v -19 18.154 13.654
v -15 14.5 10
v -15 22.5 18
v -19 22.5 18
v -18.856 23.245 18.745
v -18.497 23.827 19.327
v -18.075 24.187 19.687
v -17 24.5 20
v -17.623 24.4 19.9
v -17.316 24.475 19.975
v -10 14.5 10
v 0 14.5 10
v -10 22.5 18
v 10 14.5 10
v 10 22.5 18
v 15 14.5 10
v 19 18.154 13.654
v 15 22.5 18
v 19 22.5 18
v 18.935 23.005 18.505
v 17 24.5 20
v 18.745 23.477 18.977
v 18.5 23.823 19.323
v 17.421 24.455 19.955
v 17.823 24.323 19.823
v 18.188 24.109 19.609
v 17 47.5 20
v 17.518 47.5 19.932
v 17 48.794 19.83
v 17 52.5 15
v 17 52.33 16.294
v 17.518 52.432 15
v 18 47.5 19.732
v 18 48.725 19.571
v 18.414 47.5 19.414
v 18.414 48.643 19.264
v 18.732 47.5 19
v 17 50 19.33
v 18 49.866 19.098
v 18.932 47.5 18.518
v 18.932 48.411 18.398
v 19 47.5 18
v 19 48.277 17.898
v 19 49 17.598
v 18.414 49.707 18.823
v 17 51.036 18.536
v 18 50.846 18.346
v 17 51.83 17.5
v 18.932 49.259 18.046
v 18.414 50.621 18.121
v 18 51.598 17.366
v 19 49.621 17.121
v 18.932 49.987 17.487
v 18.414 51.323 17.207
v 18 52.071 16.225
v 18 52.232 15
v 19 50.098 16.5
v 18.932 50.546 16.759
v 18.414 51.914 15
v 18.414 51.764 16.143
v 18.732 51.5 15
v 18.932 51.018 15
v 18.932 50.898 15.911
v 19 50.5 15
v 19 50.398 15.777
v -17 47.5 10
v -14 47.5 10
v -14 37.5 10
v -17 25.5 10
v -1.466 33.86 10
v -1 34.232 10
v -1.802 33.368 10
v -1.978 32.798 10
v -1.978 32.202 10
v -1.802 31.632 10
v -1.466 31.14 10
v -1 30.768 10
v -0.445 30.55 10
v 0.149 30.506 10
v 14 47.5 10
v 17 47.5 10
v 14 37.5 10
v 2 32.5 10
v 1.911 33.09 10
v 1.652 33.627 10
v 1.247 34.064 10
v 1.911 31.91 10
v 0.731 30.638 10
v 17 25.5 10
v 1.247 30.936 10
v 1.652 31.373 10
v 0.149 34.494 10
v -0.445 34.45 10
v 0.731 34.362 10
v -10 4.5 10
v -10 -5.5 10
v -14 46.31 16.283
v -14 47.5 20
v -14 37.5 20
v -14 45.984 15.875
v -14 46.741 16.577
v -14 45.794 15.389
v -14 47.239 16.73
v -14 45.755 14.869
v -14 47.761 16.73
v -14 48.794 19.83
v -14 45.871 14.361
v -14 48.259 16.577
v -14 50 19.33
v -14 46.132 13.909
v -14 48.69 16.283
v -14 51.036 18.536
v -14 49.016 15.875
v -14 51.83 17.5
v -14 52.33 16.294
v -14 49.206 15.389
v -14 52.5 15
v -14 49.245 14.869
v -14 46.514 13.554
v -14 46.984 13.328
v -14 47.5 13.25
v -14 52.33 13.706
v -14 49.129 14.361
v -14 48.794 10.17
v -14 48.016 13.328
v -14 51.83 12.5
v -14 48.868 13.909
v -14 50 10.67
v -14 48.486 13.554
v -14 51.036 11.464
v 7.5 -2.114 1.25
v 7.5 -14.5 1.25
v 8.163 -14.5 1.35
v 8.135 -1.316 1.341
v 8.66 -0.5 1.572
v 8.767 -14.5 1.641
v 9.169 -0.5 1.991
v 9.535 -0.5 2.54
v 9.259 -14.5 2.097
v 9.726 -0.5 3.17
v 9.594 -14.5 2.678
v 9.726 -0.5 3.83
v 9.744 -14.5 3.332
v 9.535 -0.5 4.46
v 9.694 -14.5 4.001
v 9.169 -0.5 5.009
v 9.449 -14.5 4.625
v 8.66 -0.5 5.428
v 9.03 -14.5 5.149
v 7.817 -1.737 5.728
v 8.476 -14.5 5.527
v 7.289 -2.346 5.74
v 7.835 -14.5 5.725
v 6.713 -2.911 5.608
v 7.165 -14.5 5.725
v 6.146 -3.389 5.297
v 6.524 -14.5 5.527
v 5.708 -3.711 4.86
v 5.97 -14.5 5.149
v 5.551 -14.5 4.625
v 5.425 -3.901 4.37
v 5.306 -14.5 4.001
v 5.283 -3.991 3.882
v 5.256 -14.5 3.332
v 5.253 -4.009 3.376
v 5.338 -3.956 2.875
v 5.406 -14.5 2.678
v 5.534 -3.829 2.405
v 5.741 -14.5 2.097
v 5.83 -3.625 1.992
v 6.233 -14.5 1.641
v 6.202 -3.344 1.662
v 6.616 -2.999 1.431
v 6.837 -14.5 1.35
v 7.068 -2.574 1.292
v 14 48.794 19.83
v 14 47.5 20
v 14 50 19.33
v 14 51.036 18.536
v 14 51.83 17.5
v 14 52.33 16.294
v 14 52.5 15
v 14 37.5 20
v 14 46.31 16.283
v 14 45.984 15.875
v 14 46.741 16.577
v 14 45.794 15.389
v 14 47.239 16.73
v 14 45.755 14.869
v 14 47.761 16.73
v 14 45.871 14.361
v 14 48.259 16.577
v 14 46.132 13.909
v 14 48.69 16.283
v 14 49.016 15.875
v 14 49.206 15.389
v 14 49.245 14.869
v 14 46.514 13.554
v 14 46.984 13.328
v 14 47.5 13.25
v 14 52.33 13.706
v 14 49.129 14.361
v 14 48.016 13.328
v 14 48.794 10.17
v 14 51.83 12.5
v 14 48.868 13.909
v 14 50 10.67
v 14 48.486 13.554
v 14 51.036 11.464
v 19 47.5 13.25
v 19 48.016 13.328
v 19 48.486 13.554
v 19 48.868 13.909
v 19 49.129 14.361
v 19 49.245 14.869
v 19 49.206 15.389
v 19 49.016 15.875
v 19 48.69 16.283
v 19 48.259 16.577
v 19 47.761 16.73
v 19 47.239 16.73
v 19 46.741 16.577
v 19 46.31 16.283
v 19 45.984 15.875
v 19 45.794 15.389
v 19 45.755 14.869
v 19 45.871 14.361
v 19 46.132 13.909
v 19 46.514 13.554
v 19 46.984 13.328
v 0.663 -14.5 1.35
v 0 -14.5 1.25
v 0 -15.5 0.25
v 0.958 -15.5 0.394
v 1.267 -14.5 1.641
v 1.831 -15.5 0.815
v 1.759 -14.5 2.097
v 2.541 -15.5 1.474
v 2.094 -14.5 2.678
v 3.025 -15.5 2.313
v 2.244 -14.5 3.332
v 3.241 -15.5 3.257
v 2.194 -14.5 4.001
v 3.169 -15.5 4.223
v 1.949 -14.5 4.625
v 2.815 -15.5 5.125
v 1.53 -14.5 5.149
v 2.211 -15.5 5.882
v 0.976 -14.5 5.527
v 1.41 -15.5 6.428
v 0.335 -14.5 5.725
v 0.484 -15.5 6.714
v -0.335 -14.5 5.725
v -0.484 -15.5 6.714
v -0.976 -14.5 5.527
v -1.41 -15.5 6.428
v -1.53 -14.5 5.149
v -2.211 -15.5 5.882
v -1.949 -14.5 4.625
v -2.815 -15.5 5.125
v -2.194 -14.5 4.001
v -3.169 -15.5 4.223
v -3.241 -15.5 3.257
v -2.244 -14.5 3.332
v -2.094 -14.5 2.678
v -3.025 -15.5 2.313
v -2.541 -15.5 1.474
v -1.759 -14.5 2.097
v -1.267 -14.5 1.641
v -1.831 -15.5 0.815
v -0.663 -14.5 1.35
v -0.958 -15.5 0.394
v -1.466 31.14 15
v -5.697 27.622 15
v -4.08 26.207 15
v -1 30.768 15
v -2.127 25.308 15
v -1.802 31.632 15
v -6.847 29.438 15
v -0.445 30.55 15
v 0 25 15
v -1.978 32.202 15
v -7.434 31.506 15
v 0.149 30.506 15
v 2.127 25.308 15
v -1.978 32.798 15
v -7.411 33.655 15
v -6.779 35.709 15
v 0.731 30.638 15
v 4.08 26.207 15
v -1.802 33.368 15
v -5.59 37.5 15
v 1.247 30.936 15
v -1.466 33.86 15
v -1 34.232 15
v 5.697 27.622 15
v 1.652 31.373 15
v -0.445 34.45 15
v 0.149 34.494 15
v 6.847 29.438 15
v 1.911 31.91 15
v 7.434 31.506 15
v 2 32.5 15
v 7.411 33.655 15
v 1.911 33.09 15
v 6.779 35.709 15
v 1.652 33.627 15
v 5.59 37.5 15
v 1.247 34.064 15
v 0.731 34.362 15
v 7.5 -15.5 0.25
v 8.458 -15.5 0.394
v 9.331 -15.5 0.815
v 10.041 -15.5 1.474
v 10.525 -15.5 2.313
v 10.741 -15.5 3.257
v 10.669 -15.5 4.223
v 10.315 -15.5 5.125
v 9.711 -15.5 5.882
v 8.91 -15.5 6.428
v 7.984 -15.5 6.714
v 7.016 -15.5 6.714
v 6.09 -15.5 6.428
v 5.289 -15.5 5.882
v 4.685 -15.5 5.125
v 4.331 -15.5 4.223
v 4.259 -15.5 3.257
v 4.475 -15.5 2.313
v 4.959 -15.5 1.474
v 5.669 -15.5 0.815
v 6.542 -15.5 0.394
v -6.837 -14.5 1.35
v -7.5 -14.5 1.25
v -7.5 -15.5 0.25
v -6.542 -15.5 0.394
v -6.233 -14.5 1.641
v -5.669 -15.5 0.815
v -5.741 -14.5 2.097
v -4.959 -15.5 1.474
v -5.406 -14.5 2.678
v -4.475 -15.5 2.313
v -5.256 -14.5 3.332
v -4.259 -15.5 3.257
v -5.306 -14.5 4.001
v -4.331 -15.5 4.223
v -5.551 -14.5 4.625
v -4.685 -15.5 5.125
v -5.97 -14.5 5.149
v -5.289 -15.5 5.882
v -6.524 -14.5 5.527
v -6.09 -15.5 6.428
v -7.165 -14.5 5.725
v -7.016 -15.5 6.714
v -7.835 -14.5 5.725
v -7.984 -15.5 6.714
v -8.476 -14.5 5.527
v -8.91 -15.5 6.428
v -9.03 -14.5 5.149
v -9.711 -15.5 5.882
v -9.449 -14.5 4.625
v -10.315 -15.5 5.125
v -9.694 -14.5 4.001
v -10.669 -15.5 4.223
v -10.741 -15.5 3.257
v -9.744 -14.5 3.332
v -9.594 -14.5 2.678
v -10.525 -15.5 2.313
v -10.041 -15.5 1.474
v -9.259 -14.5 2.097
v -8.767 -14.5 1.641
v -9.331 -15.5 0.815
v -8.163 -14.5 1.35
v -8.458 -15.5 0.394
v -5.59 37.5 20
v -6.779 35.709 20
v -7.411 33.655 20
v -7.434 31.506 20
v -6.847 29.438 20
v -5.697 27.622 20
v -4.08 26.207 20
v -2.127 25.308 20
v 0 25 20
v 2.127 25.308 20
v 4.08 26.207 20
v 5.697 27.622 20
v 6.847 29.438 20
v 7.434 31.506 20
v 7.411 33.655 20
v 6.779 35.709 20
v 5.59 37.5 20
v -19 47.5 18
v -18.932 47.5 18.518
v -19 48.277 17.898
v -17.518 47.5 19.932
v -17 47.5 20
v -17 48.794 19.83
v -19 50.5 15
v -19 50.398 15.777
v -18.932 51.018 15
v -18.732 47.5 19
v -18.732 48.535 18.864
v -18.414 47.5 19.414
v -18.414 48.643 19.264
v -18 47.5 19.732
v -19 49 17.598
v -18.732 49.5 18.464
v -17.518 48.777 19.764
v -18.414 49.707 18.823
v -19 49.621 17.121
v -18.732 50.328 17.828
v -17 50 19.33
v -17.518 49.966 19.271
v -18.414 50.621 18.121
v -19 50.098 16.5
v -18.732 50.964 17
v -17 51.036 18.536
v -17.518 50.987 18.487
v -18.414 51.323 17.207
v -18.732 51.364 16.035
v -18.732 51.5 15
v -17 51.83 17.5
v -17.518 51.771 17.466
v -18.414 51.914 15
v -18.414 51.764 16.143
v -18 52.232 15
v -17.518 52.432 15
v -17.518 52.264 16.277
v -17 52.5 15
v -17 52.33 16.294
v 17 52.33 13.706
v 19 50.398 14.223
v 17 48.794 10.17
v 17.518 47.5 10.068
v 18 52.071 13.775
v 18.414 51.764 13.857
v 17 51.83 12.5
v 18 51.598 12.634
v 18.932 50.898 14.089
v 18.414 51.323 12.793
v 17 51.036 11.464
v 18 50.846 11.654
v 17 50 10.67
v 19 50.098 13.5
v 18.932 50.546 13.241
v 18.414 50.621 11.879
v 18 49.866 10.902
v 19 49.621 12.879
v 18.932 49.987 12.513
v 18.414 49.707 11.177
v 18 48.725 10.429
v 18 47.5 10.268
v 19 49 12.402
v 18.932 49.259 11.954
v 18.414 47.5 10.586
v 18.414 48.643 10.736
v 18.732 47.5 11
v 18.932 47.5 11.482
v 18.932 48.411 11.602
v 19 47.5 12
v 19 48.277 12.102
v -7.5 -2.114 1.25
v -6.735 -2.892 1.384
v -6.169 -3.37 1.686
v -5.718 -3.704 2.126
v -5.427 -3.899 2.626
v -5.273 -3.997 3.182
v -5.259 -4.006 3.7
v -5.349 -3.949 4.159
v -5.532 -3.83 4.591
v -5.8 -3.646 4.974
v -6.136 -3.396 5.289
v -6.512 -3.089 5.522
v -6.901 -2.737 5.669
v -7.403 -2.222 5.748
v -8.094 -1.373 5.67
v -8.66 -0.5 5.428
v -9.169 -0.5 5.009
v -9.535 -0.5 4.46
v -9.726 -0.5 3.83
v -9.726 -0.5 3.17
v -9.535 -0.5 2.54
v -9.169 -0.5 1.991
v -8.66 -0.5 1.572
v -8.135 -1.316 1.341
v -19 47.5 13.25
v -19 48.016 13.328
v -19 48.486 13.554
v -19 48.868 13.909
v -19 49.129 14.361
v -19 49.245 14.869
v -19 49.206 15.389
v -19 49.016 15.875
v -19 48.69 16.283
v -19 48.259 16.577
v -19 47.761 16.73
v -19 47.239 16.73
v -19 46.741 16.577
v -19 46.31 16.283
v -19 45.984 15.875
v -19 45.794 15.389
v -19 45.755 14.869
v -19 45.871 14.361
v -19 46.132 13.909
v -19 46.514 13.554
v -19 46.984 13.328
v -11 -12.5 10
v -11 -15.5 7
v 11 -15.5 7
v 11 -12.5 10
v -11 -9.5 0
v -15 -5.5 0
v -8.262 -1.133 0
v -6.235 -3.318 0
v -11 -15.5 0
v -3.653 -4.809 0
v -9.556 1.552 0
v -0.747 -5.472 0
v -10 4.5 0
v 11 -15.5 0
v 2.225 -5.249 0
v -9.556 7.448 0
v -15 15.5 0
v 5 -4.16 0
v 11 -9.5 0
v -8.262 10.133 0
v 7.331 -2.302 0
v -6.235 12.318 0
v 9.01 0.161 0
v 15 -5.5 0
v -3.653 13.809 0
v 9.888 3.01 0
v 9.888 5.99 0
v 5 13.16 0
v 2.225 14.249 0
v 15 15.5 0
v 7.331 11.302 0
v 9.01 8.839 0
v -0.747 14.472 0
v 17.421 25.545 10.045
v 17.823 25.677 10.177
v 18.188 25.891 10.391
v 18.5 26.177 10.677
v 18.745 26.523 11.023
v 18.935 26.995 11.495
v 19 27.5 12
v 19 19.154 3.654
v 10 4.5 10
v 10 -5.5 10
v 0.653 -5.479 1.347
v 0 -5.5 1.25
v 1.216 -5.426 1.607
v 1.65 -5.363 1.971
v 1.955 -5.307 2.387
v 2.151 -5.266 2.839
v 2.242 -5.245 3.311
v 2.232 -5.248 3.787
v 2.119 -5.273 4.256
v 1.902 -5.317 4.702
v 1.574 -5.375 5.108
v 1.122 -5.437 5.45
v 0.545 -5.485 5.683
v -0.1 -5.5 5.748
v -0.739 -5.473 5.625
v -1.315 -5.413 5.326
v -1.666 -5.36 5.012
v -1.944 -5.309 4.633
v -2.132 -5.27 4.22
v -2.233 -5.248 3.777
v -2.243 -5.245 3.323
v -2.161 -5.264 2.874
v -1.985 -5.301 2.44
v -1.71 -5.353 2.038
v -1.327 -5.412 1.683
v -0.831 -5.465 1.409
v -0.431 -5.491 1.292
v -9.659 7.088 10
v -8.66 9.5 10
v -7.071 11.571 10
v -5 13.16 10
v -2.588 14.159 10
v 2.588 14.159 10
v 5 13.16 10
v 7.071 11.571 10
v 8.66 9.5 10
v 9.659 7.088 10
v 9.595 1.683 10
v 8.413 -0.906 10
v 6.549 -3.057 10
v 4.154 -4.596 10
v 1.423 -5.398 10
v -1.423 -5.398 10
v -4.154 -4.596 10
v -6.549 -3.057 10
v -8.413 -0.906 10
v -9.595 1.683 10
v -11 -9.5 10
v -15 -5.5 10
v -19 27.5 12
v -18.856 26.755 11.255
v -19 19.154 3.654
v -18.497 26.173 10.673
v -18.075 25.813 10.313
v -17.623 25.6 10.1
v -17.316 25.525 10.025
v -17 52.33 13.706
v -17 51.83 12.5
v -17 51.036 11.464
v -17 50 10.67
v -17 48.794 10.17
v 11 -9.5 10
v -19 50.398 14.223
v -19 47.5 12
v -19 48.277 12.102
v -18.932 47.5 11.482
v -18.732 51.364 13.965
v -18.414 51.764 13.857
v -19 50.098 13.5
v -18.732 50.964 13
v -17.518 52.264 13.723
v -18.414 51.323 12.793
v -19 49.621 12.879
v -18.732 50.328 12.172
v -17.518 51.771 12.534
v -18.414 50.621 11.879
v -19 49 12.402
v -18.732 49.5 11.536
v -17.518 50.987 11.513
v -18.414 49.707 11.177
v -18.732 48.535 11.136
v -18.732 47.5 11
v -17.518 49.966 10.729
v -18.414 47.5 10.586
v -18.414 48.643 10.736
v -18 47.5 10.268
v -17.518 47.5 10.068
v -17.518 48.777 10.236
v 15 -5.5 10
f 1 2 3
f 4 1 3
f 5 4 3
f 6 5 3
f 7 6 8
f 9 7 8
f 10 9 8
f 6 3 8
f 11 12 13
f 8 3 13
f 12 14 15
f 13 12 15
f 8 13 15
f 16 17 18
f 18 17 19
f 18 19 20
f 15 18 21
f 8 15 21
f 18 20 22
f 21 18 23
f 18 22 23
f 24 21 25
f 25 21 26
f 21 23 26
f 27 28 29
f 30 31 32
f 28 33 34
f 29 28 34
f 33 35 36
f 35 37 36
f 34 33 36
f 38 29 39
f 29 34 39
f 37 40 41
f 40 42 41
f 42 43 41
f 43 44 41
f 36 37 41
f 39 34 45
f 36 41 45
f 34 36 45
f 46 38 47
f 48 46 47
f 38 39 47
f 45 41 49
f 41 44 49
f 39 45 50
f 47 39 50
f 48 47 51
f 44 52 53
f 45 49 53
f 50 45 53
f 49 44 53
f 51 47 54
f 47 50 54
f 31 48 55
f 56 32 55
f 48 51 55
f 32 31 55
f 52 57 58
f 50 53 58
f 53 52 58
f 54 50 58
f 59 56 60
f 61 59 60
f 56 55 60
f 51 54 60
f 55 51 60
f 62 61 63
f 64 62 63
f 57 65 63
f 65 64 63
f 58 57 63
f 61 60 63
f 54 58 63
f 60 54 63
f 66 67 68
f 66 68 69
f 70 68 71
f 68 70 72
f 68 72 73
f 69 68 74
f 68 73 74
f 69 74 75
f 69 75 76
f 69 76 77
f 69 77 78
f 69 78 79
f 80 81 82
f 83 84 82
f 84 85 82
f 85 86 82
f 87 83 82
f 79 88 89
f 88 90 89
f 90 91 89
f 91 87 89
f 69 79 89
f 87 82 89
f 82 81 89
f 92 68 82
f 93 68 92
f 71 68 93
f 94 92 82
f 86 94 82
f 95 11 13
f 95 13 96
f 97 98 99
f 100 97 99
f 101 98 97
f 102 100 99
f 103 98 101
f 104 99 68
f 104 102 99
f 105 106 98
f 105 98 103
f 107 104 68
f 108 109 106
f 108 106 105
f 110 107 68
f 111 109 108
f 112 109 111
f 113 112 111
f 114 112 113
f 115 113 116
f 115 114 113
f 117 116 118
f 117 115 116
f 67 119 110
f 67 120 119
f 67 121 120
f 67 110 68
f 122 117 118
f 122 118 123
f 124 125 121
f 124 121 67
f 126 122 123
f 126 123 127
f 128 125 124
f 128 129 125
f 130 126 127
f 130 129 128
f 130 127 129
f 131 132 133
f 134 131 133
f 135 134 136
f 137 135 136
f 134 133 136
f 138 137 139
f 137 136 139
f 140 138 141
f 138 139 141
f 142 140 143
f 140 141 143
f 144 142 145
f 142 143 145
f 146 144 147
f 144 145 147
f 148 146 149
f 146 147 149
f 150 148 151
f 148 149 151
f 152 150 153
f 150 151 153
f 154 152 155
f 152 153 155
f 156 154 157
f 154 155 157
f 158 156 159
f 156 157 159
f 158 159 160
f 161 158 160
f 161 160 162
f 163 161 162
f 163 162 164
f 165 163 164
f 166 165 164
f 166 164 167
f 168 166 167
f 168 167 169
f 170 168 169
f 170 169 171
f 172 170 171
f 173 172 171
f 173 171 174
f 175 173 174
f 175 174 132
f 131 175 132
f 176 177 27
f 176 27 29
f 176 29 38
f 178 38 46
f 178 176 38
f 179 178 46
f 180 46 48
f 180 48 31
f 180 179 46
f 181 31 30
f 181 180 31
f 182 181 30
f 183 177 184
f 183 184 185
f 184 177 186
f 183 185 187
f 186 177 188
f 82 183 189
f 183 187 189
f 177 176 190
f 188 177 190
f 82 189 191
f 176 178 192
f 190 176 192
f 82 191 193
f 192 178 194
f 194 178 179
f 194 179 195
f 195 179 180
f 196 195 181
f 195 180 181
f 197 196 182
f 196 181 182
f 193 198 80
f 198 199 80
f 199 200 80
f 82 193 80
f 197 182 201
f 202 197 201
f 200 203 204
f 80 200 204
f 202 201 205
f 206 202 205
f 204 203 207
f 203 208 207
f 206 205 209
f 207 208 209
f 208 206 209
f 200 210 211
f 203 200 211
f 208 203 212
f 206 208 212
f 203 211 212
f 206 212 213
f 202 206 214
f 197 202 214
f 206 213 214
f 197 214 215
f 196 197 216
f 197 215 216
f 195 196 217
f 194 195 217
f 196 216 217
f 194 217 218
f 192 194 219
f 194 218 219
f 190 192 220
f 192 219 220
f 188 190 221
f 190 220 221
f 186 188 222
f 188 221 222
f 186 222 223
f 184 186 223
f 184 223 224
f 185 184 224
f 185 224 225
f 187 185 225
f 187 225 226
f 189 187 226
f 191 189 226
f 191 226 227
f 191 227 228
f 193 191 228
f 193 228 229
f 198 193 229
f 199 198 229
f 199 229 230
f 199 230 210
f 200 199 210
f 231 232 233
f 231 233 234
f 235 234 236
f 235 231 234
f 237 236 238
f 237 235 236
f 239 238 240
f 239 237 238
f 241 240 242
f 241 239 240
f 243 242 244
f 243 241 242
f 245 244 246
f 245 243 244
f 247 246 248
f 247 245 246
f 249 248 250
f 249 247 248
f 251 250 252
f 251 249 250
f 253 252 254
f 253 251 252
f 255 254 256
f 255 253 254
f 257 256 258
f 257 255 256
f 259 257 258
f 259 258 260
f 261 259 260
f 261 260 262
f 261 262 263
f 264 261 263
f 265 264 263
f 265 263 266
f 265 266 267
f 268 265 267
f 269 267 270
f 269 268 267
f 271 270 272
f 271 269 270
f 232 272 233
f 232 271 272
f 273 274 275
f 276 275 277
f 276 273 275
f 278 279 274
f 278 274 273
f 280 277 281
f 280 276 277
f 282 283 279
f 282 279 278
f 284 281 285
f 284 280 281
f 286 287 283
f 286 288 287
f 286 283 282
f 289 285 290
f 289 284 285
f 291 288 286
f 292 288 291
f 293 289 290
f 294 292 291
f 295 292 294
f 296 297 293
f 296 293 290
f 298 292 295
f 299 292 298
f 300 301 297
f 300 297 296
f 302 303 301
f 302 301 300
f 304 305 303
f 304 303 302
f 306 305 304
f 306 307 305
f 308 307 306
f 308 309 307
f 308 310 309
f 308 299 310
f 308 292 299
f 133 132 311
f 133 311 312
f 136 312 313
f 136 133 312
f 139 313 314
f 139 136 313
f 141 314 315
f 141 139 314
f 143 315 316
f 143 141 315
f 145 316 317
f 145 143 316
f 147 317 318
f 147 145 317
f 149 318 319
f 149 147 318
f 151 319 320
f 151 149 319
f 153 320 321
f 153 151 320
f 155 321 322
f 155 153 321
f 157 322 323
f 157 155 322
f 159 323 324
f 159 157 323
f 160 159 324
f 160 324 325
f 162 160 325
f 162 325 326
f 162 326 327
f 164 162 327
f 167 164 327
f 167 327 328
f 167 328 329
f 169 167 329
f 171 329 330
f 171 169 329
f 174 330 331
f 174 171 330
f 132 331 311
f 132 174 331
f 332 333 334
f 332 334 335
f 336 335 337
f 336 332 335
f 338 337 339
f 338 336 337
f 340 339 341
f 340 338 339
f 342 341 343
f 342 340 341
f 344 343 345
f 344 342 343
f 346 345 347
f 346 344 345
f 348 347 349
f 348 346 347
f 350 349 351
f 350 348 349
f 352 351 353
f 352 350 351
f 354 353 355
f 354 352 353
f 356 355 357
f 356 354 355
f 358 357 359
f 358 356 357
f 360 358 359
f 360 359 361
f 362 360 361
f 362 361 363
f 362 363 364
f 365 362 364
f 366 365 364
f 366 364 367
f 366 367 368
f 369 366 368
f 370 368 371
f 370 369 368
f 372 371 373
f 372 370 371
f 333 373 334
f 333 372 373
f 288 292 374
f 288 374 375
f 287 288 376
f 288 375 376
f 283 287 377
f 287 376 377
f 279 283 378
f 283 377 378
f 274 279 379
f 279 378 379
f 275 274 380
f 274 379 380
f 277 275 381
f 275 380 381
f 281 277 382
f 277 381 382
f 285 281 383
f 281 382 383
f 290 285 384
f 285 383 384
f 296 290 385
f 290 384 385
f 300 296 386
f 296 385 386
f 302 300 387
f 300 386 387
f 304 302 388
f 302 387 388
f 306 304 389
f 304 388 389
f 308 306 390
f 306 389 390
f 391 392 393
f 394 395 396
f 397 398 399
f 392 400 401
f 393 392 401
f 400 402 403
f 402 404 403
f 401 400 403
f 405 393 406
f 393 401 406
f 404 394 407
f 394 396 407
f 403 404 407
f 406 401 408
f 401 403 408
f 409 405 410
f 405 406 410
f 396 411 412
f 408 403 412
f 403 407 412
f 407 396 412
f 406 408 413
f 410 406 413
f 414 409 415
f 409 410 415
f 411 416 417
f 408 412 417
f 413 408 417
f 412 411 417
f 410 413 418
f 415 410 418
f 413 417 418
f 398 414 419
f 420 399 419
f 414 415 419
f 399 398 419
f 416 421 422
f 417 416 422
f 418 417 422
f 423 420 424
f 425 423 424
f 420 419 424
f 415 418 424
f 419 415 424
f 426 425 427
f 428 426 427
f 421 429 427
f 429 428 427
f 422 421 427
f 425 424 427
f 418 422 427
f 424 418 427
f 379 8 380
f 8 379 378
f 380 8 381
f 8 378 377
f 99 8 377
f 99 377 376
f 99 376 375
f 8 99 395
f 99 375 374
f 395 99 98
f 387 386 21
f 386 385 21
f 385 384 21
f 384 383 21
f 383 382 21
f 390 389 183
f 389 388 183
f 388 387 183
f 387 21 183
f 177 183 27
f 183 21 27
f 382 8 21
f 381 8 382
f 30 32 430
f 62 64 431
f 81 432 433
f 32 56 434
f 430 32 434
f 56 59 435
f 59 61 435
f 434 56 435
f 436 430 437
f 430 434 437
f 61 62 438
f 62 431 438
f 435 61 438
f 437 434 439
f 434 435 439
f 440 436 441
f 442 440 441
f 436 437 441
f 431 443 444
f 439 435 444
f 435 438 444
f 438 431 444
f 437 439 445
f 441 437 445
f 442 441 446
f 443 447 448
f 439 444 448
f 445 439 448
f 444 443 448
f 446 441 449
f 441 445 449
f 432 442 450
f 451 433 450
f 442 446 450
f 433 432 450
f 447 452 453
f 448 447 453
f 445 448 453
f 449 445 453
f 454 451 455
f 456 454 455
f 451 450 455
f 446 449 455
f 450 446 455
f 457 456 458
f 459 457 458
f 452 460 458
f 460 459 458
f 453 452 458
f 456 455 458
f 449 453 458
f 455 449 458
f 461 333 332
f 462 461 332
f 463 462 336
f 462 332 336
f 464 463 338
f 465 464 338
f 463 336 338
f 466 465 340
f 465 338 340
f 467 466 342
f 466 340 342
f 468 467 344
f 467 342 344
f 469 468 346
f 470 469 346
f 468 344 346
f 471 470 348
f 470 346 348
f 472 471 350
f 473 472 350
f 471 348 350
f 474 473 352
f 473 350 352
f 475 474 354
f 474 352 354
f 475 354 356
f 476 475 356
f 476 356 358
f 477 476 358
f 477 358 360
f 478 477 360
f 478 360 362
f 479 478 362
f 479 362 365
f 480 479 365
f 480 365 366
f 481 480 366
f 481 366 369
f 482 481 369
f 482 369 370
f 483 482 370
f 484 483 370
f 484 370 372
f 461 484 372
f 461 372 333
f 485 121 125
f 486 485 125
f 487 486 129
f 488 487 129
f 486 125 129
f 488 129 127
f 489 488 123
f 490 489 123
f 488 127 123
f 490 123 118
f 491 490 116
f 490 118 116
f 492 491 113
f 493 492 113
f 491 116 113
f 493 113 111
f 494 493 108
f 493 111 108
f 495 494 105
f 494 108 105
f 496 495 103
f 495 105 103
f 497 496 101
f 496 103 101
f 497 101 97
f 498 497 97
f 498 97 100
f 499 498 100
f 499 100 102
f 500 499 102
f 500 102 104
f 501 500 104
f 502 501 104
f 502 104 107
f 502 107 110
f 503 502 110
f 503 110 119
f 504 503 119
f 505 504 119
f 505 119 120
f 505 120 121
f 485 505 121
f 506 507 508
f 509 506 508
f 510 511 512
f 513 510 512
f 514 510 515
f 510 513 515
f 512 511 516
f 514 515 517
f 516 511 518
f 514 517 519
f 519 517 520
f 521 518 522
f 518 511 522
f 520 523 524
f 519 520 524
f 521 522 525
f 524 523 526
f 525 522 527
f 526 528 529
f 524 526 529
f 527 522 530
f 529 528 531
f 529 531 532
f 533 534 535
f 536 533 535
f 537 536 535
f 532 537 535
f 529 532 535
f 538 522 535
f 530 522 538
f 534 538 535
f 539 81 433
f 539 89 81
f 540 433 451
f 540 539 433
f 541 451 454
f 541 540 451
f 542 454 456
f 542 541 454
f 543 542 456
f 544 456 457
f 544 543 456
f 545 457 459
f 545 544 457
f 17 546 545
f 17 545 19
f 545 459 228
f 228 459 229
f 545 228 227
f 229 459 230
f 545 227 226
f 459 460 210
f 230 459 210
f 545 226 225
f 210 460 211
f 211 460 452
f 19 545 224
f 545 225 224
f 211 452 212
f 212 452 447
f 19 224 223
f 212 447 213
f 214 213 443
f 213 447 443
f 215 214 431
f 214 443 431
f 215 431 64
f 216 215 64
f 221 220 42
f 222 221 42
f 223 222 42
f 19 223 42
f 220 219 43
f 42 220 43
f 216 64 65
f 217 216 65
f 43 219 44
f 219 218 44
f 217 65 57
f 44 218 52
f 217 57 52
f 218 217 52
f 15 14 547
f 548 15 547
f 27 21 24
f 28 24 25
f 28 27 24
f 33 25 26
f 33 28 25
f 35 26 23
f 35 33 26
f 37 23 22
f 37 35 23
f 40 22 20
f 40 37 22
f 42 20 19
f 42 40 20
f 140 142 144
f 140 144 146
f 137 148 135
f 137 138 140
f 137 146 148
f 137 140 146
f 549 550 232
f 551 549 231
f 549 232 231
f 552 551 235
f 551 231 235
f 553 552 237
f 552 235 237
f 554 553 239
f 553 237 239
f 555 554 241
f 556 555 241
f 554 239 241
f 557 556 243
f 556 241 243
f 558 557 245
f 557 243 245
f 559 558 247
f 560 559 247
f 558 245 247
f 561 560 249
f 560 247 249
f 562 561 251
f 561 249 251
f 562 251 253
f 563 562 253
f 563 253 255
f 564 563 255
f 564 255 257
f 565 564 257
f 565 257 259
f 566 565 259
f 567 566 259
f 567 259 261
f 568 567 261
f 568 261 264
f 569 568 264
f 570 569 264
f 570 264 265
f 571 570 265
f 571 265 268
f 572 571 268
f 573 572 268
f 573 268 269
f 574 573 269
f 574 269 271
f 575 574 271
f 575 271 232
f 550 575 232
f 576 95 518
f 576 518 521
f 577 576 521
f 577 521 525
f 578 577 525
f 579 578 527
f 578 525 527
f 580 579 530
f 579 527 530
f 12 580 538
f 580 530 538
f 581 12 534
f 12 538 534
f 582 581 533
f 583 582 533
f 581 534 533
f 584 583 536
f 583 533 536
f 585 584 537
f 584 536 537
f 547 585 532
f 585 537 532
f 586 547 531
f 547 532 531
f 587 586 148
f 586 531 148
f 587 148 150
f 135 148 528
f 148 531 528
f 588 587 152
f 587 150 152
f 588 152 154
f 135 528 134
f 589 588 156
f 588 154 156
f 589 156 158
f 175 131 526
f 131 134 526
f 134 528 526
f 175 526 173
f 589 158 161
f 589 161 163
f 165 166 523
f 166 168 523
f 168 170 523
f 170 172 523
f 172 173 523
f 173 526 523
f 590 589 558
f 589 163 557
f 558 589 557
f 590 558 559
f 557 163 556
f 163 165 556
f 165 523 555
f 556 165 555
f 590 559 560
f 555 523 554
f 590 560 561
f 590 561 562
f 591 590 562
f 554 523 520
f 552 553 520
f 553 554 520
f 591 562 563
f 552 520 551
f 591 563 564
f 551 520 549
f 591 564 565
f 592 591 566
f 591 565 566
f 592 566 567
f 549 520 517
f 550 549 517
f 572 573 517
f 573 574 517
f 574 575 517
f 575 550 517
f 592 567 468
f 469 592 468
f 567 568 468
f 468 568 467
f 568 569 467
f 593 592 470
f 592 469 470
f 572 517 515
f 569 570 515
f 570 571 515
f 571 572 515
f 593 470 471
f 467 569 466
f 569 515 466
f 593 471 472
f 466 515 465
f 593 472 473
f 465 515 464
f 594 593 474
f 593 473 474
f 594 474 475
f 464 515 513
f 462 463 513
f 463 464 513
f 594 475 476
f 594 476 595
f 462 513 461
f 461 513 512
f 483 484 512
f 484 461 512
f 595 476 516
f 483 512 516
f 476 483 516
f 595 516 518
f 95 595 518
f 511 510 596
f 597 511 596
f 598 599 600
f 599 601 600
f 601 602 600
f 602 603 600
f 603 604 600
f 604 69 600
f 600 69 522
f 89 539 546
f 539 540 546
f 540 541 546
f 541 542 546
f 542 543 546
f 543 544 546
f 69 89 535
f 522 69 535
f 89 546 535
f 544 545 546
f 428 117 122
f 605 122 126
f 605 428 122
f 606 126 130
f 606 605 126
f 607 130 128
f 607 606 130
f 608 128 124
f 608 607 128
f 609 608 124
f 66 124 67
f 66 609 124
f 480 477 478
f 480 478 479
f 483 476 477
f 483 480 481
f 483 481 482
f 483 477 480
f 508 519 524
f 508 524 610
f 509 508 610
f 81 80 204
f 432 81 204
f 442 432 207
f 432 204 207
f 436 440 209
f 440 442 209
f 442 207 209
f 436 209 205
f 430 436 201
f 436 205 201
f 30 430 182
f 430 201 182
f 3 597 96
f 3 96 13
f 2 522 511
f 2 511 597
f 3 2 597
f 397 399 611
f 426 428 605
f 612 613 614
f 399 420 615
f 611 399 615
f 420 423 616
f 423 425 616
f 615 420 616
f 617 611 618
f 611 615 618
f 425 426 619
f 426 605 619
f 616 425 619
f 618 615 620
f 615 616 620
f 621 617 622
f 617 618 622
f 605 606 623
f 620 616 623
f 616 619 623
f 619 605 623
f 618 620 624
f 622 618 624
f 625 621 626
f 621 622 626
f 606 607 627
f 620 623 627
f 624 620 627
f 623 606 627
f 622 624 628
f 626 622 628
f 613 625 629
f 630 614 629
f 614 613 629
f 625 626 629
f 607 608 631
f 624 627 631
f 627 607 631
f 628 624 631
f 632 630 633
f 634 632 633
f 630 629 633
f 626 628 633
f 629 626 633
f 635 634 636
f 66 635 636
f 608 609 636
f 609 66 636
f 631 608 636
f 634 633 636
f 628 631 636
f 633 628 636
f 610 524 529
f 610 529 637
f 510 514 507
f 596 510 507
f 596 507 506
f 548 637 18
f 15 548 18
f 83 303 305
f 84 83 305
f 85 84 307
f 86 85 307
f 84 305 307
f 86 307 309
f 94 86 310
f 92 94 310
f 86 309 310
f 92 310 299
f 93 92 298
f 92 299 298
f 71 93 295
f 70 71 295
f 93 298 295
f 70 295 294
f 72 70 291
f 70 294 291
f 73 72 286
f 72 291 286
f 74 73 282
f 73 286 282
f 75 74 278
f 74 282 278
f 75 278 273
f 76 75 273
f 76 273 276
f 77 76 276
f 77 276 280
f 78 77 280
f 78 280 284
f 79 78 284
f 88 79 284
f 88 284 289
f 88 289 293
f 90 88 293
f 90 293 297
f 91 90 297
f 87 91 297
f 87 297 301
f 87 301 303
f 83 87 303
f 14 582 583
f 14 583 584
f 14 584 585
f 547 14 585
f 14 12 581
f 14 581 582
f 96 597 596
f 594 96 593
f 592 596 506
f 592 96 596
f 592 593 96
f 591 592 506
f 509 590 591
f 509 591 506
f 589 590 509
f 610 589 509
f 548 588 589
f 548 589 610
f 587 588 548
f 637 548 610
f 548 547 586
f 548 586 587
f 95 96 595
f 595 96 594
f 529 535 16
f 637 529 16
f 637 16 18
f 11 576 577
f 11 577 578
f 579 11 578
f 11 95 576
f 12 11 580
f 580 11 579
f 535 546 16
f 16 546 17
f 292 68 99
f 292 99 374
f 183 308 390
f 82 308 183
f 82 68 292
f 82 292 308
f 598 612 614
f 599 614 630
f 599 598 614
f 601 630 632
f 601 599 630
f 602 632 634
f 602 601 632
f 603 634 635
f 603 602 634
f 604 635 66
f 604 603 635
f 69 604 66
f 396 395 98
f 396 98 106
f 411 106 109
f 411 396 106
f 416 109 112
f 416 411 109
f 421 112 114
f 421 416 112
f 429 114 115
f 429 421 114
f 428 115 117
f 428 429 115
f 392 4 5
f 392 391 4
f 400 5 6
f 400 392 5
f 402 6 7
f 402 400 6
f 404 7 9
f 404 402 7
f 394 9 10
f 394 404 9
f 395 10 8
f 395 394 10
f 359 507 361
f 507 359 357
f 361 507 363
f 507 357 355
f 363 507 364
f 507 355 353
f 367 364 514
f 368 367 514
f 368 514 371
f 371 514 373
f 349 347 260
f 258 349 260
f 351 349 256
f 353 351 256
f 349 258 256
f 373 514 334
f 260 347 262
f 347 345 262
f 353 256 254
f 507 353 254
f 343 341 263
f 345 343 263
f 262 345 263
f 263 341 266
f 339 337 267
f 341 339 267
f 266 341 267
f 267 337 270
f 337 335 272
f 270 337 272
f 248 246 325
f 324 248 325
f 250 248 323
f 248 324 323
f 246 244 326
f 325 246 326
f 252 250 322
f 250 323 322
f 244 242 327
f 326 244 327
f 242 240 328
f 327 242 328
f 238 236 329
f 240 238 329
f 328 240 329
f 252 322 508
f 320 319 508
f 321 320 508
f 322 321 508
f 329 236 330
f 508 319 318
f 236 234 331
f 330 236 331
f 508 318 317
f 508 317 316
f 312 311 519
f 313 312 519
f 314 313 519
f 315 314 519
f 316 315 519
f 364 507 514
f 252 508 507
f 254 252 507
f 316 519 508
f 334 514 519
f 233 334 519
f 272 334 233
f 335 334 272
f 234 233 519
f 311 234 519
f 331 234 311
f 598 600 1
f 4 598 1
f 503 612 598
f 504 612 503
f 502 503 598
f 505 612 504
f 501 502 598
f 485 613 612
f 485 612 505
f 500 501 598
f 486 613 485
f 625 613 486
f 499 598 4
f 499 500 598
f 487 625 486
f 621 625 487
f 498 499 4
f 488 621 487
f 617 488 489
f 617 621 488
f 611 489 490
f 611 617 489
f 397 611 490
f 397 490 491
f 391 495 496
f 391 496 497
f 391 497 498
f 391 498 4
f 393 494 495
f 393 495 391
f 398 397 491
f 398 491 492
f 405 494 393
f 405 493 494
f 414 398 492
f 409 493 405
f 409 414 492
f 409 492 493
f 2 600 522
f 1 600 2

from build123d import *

# Parameters (mm, degrees)
SKETCH1_W           = 30
SKETCH1_H           = 31
BOSS_EXTRUDE1_DEPTH = 10
SKETCH2_W           = 4
SKETCH2_H           = 10
CUT_EXTRUDE1_DEPTH  = 10
CHAMFER1_SIZE       = 4
SKETCH3_R           = 2.25
CUT_EXTRUDE2_DEPTH  = 15
CHAMFER2_SIZE       = 1
SKETCH4_R           = 10
CUT_EXTRUDE3_DEPTH  = 24.774986856
BOSS_EXTRUDE2_DEPTH = 19
CHAMFER3_SIZE       = 4
SKETCH6_W           = 28
SKETCH6_H           = 10
CUT_EXTRUDE4_DEPTH  = 15
FILLET1_R           = 5
SKETCH7_R           = 1.75
CUT_EXTRUDE5_DEPTH  = 68.825142831
FILLET2_R           = 2
SKETCH8_R           = 2
CUT_EXTRUDE6_DEPTH  = 60.306407782
SKETCH9_R           = 7.5
CUT_EXTRUDE7_DEPTH  = 5
BOSS_EXTRUDE3_DEPTH = 5
CHAMFER4_SIZE       = 3


with BuildPart() as part:
    # Sketch1 → Boss-Extrude1 (new body)
    with BuildSketch(Plane.XY):
        Rectangle(SKETCH1_W, SKETCH1_H)
    extrude(amount=BOSS_EXTRUDE1_DEPTH)

    # Sketch2 → Cut-Extrude1 (cut)
    with BuildSketch(Plane.XZ.offset(15.5)):
        with Locations((-13, 5)):
            Rectangle(SKETCH2_W, SKETCH2_H)
        with Locations((13, 5)):
            Rectangle(SKETCH2_W, SKETCH2_H)
    extrude(amount=-CUT_EXTRUDE1_DEPTH, mode=Mode.SUBTRACT)

    # Chamfer1
    chamfer1_edges = [part.edges().sort_by_distance(p)[0] for p in [
        (11, -5.5, 5),
        (-11, -5.5, 5),
    ]]
    chamfer(chamfer1_edges, length=CHAMFER1_SIZE - 0.0001)  # a hair under: the kernel refuses the full size

    # Sketch3 → Cut-Extrude2 (cut)
    with BuildSketch(Plane.XZ.offset(15.5)):
        with Locations(Location((-7.5, 3.5, 0), (0, 0, 270))):
            Circle(SKETCH3_R)
        with Locations(Location((0, 3.5, 0), (0, 0, 270))):
            Circle(SKETCH3_R)
        with Locations(Location((7.5, 3.5, 0), (0, 0, 270))):
            Circle(SKETCH3_R)
    extrude(amount=-CUT_EXTRUDE2_DEPTH, mode=Mode.SUBTRACT)

    # Chamfer2
    chamfer2_edges = [part.edges().sort_by_distance(p)[0] for p in [
        (-7.5, -15.5, 5.75),
        (0, -15.5, 5.75),
        (7.5, -15.5, 5.75),
    ]]
    chamfer(chamfer2_edges, length=CHAMFER2_SIZE)

    # Sketch4 → Cut-Extrude3 (cut, through all)
    with BuildSketch(Plane(origin=(0, 0, 0), x_dir=(-1, 0, 0), z_dir=(0, 0, -1))):
        with Locations((0, 4.5)):
            Circle(SKETCH4_R)
    extrude(amount=-CUT_EXTRUDE3_DEPTH, mode=Mode.SUBTRACT)

    # Sketch5 → Boss-Extrude2 (add, symmetric)
    with BuildSketch(Plane(origin=(0, 0, 0), x_dir=(0, 0, -1), z_dir=(1, 0, 0))):
        Polygon((-10, 14.5), (-20, 24.5), (-20, 52.5), (-10, 52.5), (-10, 25.5), (0, 15.5), align=None)
    extrude(amount=BOSS_EXTRUDE2_DEPTH, both=True)

    # Chamfer3
    chamfer3_edges = [part.edges().sort_by_distance(p)[0] for p in [
        (-19, 15, 5),
        (19, 15, 5),
    ]]
    chamfer(chamfer3_edges, length=CHAMFER3_SIZE - 0.0001)  # a hair under: the kernel refuses the full size

    # Sketch6 → Cut-Extrude4 (cut)
    with BuildSketch(Plane(origin=(0, 52.5, 0), x_dir=(1, 0, 0), z_dir=(0, 1, 0))):
        with Locations((0, -15)):
            Rectangle(SKETCH6_W, SKETCH6_H)
    extrude(amount=-CUT_EXTRUDE4_DEPTH, mode=Mode.SUBTRACT)

    # Fillet1
    fillet1_edges = [part.edges().sort_by_distance(p)[0] for p in [
        (16.5, 52.5, 10),
        (16.5, 52.5, 20),
        (-16.5, 52.5, 10),
        (-16.5, 52.5, 20),
    ]]
    fillet(fillet1_edges, radius=FILLET1_R - 0.0001)  # a hair under: the kernel refuses the full size

    # Sketch7 → Cut-Extrude5 (cut, through all)
    with BuildSketch(Plane(origin=(19, 0, 0), x_dir=(0, 0, -1), z_dir=(1, 0, 0))):
        with Locations((-15, 47.5)):
            Circle(SKETCH7_R)
    extrude(amount=-CUT_EXTRUDE5_DEPTH, mode=Mode.SUBTRACT)

    # Fillet2
    fillet2_edges = [part.edges().sort_by_distance(p)[0] for p in [
        (19, 36.00005, 20),
        (19, 51.035563195, 18.535563195),
        (19, 51.035563195, 11.464436805),
        (-19, 36.00005, 20),
        (-19, 51.035563195, 18.535563195),
        (-19, 51.035563195, 11.464436805),
        (-19, 36.50005, 10),
        (19, 36.50005, 10),
    ]]
    fillet(fillet2_edges, radius=FILLET2_R)

    # Sketch8 → Cut-Extrude6 (cut, through all)
    with BuildSketch(Plane.XY.offset(20)):
        with Locations((0, 32.5)):
            Circle(SKETCH8_R)
    extrude(amount=-CUT_EXTRUDE6_DEPTH, mode=Mode.SUBTRACT)

    # Sketch9 → Cut-Extrude7 (cut)
    with BuildSketch(Plane.XY.offset(20)):
        with Locations((0, 32.5)):
            Circle(SKETCH9_R)
    extrude(amount=-CUT_EXTRUDE7_DEPTH, mode=Mode.SUBTRACT)

    # Sketch10 → Boss-Extrude3 (add)
    with BuildSketch(Plane(origin=(15, 0, 0), x_dir=(0, 0, -1), z_dir=(1, 0, 0))):
        Polygon((-10, -5.5), (-18, 22.5), (-10, 14.5), align=None)
    boss_extrude3 = extrude(amount=-BOSS_EXTRUDE3_DEPTH)

    # Mirror1: Boss-Extrude3 across plane
    add(boss_extrude3.mirror(Plane(origin=(0, 0, 0), x_dir=(0, 0, 1), z_dir=(1, 0, 0))))

    # Chamfer4
    chamfer4_edges = [part.edges().sort_by_distance(p)[0] for p in [
        (0, -15.5, 10),
    ]]
    chamfer(chamfer4_edges, length=CHAMFER4_SIZE)


solid = part.part
